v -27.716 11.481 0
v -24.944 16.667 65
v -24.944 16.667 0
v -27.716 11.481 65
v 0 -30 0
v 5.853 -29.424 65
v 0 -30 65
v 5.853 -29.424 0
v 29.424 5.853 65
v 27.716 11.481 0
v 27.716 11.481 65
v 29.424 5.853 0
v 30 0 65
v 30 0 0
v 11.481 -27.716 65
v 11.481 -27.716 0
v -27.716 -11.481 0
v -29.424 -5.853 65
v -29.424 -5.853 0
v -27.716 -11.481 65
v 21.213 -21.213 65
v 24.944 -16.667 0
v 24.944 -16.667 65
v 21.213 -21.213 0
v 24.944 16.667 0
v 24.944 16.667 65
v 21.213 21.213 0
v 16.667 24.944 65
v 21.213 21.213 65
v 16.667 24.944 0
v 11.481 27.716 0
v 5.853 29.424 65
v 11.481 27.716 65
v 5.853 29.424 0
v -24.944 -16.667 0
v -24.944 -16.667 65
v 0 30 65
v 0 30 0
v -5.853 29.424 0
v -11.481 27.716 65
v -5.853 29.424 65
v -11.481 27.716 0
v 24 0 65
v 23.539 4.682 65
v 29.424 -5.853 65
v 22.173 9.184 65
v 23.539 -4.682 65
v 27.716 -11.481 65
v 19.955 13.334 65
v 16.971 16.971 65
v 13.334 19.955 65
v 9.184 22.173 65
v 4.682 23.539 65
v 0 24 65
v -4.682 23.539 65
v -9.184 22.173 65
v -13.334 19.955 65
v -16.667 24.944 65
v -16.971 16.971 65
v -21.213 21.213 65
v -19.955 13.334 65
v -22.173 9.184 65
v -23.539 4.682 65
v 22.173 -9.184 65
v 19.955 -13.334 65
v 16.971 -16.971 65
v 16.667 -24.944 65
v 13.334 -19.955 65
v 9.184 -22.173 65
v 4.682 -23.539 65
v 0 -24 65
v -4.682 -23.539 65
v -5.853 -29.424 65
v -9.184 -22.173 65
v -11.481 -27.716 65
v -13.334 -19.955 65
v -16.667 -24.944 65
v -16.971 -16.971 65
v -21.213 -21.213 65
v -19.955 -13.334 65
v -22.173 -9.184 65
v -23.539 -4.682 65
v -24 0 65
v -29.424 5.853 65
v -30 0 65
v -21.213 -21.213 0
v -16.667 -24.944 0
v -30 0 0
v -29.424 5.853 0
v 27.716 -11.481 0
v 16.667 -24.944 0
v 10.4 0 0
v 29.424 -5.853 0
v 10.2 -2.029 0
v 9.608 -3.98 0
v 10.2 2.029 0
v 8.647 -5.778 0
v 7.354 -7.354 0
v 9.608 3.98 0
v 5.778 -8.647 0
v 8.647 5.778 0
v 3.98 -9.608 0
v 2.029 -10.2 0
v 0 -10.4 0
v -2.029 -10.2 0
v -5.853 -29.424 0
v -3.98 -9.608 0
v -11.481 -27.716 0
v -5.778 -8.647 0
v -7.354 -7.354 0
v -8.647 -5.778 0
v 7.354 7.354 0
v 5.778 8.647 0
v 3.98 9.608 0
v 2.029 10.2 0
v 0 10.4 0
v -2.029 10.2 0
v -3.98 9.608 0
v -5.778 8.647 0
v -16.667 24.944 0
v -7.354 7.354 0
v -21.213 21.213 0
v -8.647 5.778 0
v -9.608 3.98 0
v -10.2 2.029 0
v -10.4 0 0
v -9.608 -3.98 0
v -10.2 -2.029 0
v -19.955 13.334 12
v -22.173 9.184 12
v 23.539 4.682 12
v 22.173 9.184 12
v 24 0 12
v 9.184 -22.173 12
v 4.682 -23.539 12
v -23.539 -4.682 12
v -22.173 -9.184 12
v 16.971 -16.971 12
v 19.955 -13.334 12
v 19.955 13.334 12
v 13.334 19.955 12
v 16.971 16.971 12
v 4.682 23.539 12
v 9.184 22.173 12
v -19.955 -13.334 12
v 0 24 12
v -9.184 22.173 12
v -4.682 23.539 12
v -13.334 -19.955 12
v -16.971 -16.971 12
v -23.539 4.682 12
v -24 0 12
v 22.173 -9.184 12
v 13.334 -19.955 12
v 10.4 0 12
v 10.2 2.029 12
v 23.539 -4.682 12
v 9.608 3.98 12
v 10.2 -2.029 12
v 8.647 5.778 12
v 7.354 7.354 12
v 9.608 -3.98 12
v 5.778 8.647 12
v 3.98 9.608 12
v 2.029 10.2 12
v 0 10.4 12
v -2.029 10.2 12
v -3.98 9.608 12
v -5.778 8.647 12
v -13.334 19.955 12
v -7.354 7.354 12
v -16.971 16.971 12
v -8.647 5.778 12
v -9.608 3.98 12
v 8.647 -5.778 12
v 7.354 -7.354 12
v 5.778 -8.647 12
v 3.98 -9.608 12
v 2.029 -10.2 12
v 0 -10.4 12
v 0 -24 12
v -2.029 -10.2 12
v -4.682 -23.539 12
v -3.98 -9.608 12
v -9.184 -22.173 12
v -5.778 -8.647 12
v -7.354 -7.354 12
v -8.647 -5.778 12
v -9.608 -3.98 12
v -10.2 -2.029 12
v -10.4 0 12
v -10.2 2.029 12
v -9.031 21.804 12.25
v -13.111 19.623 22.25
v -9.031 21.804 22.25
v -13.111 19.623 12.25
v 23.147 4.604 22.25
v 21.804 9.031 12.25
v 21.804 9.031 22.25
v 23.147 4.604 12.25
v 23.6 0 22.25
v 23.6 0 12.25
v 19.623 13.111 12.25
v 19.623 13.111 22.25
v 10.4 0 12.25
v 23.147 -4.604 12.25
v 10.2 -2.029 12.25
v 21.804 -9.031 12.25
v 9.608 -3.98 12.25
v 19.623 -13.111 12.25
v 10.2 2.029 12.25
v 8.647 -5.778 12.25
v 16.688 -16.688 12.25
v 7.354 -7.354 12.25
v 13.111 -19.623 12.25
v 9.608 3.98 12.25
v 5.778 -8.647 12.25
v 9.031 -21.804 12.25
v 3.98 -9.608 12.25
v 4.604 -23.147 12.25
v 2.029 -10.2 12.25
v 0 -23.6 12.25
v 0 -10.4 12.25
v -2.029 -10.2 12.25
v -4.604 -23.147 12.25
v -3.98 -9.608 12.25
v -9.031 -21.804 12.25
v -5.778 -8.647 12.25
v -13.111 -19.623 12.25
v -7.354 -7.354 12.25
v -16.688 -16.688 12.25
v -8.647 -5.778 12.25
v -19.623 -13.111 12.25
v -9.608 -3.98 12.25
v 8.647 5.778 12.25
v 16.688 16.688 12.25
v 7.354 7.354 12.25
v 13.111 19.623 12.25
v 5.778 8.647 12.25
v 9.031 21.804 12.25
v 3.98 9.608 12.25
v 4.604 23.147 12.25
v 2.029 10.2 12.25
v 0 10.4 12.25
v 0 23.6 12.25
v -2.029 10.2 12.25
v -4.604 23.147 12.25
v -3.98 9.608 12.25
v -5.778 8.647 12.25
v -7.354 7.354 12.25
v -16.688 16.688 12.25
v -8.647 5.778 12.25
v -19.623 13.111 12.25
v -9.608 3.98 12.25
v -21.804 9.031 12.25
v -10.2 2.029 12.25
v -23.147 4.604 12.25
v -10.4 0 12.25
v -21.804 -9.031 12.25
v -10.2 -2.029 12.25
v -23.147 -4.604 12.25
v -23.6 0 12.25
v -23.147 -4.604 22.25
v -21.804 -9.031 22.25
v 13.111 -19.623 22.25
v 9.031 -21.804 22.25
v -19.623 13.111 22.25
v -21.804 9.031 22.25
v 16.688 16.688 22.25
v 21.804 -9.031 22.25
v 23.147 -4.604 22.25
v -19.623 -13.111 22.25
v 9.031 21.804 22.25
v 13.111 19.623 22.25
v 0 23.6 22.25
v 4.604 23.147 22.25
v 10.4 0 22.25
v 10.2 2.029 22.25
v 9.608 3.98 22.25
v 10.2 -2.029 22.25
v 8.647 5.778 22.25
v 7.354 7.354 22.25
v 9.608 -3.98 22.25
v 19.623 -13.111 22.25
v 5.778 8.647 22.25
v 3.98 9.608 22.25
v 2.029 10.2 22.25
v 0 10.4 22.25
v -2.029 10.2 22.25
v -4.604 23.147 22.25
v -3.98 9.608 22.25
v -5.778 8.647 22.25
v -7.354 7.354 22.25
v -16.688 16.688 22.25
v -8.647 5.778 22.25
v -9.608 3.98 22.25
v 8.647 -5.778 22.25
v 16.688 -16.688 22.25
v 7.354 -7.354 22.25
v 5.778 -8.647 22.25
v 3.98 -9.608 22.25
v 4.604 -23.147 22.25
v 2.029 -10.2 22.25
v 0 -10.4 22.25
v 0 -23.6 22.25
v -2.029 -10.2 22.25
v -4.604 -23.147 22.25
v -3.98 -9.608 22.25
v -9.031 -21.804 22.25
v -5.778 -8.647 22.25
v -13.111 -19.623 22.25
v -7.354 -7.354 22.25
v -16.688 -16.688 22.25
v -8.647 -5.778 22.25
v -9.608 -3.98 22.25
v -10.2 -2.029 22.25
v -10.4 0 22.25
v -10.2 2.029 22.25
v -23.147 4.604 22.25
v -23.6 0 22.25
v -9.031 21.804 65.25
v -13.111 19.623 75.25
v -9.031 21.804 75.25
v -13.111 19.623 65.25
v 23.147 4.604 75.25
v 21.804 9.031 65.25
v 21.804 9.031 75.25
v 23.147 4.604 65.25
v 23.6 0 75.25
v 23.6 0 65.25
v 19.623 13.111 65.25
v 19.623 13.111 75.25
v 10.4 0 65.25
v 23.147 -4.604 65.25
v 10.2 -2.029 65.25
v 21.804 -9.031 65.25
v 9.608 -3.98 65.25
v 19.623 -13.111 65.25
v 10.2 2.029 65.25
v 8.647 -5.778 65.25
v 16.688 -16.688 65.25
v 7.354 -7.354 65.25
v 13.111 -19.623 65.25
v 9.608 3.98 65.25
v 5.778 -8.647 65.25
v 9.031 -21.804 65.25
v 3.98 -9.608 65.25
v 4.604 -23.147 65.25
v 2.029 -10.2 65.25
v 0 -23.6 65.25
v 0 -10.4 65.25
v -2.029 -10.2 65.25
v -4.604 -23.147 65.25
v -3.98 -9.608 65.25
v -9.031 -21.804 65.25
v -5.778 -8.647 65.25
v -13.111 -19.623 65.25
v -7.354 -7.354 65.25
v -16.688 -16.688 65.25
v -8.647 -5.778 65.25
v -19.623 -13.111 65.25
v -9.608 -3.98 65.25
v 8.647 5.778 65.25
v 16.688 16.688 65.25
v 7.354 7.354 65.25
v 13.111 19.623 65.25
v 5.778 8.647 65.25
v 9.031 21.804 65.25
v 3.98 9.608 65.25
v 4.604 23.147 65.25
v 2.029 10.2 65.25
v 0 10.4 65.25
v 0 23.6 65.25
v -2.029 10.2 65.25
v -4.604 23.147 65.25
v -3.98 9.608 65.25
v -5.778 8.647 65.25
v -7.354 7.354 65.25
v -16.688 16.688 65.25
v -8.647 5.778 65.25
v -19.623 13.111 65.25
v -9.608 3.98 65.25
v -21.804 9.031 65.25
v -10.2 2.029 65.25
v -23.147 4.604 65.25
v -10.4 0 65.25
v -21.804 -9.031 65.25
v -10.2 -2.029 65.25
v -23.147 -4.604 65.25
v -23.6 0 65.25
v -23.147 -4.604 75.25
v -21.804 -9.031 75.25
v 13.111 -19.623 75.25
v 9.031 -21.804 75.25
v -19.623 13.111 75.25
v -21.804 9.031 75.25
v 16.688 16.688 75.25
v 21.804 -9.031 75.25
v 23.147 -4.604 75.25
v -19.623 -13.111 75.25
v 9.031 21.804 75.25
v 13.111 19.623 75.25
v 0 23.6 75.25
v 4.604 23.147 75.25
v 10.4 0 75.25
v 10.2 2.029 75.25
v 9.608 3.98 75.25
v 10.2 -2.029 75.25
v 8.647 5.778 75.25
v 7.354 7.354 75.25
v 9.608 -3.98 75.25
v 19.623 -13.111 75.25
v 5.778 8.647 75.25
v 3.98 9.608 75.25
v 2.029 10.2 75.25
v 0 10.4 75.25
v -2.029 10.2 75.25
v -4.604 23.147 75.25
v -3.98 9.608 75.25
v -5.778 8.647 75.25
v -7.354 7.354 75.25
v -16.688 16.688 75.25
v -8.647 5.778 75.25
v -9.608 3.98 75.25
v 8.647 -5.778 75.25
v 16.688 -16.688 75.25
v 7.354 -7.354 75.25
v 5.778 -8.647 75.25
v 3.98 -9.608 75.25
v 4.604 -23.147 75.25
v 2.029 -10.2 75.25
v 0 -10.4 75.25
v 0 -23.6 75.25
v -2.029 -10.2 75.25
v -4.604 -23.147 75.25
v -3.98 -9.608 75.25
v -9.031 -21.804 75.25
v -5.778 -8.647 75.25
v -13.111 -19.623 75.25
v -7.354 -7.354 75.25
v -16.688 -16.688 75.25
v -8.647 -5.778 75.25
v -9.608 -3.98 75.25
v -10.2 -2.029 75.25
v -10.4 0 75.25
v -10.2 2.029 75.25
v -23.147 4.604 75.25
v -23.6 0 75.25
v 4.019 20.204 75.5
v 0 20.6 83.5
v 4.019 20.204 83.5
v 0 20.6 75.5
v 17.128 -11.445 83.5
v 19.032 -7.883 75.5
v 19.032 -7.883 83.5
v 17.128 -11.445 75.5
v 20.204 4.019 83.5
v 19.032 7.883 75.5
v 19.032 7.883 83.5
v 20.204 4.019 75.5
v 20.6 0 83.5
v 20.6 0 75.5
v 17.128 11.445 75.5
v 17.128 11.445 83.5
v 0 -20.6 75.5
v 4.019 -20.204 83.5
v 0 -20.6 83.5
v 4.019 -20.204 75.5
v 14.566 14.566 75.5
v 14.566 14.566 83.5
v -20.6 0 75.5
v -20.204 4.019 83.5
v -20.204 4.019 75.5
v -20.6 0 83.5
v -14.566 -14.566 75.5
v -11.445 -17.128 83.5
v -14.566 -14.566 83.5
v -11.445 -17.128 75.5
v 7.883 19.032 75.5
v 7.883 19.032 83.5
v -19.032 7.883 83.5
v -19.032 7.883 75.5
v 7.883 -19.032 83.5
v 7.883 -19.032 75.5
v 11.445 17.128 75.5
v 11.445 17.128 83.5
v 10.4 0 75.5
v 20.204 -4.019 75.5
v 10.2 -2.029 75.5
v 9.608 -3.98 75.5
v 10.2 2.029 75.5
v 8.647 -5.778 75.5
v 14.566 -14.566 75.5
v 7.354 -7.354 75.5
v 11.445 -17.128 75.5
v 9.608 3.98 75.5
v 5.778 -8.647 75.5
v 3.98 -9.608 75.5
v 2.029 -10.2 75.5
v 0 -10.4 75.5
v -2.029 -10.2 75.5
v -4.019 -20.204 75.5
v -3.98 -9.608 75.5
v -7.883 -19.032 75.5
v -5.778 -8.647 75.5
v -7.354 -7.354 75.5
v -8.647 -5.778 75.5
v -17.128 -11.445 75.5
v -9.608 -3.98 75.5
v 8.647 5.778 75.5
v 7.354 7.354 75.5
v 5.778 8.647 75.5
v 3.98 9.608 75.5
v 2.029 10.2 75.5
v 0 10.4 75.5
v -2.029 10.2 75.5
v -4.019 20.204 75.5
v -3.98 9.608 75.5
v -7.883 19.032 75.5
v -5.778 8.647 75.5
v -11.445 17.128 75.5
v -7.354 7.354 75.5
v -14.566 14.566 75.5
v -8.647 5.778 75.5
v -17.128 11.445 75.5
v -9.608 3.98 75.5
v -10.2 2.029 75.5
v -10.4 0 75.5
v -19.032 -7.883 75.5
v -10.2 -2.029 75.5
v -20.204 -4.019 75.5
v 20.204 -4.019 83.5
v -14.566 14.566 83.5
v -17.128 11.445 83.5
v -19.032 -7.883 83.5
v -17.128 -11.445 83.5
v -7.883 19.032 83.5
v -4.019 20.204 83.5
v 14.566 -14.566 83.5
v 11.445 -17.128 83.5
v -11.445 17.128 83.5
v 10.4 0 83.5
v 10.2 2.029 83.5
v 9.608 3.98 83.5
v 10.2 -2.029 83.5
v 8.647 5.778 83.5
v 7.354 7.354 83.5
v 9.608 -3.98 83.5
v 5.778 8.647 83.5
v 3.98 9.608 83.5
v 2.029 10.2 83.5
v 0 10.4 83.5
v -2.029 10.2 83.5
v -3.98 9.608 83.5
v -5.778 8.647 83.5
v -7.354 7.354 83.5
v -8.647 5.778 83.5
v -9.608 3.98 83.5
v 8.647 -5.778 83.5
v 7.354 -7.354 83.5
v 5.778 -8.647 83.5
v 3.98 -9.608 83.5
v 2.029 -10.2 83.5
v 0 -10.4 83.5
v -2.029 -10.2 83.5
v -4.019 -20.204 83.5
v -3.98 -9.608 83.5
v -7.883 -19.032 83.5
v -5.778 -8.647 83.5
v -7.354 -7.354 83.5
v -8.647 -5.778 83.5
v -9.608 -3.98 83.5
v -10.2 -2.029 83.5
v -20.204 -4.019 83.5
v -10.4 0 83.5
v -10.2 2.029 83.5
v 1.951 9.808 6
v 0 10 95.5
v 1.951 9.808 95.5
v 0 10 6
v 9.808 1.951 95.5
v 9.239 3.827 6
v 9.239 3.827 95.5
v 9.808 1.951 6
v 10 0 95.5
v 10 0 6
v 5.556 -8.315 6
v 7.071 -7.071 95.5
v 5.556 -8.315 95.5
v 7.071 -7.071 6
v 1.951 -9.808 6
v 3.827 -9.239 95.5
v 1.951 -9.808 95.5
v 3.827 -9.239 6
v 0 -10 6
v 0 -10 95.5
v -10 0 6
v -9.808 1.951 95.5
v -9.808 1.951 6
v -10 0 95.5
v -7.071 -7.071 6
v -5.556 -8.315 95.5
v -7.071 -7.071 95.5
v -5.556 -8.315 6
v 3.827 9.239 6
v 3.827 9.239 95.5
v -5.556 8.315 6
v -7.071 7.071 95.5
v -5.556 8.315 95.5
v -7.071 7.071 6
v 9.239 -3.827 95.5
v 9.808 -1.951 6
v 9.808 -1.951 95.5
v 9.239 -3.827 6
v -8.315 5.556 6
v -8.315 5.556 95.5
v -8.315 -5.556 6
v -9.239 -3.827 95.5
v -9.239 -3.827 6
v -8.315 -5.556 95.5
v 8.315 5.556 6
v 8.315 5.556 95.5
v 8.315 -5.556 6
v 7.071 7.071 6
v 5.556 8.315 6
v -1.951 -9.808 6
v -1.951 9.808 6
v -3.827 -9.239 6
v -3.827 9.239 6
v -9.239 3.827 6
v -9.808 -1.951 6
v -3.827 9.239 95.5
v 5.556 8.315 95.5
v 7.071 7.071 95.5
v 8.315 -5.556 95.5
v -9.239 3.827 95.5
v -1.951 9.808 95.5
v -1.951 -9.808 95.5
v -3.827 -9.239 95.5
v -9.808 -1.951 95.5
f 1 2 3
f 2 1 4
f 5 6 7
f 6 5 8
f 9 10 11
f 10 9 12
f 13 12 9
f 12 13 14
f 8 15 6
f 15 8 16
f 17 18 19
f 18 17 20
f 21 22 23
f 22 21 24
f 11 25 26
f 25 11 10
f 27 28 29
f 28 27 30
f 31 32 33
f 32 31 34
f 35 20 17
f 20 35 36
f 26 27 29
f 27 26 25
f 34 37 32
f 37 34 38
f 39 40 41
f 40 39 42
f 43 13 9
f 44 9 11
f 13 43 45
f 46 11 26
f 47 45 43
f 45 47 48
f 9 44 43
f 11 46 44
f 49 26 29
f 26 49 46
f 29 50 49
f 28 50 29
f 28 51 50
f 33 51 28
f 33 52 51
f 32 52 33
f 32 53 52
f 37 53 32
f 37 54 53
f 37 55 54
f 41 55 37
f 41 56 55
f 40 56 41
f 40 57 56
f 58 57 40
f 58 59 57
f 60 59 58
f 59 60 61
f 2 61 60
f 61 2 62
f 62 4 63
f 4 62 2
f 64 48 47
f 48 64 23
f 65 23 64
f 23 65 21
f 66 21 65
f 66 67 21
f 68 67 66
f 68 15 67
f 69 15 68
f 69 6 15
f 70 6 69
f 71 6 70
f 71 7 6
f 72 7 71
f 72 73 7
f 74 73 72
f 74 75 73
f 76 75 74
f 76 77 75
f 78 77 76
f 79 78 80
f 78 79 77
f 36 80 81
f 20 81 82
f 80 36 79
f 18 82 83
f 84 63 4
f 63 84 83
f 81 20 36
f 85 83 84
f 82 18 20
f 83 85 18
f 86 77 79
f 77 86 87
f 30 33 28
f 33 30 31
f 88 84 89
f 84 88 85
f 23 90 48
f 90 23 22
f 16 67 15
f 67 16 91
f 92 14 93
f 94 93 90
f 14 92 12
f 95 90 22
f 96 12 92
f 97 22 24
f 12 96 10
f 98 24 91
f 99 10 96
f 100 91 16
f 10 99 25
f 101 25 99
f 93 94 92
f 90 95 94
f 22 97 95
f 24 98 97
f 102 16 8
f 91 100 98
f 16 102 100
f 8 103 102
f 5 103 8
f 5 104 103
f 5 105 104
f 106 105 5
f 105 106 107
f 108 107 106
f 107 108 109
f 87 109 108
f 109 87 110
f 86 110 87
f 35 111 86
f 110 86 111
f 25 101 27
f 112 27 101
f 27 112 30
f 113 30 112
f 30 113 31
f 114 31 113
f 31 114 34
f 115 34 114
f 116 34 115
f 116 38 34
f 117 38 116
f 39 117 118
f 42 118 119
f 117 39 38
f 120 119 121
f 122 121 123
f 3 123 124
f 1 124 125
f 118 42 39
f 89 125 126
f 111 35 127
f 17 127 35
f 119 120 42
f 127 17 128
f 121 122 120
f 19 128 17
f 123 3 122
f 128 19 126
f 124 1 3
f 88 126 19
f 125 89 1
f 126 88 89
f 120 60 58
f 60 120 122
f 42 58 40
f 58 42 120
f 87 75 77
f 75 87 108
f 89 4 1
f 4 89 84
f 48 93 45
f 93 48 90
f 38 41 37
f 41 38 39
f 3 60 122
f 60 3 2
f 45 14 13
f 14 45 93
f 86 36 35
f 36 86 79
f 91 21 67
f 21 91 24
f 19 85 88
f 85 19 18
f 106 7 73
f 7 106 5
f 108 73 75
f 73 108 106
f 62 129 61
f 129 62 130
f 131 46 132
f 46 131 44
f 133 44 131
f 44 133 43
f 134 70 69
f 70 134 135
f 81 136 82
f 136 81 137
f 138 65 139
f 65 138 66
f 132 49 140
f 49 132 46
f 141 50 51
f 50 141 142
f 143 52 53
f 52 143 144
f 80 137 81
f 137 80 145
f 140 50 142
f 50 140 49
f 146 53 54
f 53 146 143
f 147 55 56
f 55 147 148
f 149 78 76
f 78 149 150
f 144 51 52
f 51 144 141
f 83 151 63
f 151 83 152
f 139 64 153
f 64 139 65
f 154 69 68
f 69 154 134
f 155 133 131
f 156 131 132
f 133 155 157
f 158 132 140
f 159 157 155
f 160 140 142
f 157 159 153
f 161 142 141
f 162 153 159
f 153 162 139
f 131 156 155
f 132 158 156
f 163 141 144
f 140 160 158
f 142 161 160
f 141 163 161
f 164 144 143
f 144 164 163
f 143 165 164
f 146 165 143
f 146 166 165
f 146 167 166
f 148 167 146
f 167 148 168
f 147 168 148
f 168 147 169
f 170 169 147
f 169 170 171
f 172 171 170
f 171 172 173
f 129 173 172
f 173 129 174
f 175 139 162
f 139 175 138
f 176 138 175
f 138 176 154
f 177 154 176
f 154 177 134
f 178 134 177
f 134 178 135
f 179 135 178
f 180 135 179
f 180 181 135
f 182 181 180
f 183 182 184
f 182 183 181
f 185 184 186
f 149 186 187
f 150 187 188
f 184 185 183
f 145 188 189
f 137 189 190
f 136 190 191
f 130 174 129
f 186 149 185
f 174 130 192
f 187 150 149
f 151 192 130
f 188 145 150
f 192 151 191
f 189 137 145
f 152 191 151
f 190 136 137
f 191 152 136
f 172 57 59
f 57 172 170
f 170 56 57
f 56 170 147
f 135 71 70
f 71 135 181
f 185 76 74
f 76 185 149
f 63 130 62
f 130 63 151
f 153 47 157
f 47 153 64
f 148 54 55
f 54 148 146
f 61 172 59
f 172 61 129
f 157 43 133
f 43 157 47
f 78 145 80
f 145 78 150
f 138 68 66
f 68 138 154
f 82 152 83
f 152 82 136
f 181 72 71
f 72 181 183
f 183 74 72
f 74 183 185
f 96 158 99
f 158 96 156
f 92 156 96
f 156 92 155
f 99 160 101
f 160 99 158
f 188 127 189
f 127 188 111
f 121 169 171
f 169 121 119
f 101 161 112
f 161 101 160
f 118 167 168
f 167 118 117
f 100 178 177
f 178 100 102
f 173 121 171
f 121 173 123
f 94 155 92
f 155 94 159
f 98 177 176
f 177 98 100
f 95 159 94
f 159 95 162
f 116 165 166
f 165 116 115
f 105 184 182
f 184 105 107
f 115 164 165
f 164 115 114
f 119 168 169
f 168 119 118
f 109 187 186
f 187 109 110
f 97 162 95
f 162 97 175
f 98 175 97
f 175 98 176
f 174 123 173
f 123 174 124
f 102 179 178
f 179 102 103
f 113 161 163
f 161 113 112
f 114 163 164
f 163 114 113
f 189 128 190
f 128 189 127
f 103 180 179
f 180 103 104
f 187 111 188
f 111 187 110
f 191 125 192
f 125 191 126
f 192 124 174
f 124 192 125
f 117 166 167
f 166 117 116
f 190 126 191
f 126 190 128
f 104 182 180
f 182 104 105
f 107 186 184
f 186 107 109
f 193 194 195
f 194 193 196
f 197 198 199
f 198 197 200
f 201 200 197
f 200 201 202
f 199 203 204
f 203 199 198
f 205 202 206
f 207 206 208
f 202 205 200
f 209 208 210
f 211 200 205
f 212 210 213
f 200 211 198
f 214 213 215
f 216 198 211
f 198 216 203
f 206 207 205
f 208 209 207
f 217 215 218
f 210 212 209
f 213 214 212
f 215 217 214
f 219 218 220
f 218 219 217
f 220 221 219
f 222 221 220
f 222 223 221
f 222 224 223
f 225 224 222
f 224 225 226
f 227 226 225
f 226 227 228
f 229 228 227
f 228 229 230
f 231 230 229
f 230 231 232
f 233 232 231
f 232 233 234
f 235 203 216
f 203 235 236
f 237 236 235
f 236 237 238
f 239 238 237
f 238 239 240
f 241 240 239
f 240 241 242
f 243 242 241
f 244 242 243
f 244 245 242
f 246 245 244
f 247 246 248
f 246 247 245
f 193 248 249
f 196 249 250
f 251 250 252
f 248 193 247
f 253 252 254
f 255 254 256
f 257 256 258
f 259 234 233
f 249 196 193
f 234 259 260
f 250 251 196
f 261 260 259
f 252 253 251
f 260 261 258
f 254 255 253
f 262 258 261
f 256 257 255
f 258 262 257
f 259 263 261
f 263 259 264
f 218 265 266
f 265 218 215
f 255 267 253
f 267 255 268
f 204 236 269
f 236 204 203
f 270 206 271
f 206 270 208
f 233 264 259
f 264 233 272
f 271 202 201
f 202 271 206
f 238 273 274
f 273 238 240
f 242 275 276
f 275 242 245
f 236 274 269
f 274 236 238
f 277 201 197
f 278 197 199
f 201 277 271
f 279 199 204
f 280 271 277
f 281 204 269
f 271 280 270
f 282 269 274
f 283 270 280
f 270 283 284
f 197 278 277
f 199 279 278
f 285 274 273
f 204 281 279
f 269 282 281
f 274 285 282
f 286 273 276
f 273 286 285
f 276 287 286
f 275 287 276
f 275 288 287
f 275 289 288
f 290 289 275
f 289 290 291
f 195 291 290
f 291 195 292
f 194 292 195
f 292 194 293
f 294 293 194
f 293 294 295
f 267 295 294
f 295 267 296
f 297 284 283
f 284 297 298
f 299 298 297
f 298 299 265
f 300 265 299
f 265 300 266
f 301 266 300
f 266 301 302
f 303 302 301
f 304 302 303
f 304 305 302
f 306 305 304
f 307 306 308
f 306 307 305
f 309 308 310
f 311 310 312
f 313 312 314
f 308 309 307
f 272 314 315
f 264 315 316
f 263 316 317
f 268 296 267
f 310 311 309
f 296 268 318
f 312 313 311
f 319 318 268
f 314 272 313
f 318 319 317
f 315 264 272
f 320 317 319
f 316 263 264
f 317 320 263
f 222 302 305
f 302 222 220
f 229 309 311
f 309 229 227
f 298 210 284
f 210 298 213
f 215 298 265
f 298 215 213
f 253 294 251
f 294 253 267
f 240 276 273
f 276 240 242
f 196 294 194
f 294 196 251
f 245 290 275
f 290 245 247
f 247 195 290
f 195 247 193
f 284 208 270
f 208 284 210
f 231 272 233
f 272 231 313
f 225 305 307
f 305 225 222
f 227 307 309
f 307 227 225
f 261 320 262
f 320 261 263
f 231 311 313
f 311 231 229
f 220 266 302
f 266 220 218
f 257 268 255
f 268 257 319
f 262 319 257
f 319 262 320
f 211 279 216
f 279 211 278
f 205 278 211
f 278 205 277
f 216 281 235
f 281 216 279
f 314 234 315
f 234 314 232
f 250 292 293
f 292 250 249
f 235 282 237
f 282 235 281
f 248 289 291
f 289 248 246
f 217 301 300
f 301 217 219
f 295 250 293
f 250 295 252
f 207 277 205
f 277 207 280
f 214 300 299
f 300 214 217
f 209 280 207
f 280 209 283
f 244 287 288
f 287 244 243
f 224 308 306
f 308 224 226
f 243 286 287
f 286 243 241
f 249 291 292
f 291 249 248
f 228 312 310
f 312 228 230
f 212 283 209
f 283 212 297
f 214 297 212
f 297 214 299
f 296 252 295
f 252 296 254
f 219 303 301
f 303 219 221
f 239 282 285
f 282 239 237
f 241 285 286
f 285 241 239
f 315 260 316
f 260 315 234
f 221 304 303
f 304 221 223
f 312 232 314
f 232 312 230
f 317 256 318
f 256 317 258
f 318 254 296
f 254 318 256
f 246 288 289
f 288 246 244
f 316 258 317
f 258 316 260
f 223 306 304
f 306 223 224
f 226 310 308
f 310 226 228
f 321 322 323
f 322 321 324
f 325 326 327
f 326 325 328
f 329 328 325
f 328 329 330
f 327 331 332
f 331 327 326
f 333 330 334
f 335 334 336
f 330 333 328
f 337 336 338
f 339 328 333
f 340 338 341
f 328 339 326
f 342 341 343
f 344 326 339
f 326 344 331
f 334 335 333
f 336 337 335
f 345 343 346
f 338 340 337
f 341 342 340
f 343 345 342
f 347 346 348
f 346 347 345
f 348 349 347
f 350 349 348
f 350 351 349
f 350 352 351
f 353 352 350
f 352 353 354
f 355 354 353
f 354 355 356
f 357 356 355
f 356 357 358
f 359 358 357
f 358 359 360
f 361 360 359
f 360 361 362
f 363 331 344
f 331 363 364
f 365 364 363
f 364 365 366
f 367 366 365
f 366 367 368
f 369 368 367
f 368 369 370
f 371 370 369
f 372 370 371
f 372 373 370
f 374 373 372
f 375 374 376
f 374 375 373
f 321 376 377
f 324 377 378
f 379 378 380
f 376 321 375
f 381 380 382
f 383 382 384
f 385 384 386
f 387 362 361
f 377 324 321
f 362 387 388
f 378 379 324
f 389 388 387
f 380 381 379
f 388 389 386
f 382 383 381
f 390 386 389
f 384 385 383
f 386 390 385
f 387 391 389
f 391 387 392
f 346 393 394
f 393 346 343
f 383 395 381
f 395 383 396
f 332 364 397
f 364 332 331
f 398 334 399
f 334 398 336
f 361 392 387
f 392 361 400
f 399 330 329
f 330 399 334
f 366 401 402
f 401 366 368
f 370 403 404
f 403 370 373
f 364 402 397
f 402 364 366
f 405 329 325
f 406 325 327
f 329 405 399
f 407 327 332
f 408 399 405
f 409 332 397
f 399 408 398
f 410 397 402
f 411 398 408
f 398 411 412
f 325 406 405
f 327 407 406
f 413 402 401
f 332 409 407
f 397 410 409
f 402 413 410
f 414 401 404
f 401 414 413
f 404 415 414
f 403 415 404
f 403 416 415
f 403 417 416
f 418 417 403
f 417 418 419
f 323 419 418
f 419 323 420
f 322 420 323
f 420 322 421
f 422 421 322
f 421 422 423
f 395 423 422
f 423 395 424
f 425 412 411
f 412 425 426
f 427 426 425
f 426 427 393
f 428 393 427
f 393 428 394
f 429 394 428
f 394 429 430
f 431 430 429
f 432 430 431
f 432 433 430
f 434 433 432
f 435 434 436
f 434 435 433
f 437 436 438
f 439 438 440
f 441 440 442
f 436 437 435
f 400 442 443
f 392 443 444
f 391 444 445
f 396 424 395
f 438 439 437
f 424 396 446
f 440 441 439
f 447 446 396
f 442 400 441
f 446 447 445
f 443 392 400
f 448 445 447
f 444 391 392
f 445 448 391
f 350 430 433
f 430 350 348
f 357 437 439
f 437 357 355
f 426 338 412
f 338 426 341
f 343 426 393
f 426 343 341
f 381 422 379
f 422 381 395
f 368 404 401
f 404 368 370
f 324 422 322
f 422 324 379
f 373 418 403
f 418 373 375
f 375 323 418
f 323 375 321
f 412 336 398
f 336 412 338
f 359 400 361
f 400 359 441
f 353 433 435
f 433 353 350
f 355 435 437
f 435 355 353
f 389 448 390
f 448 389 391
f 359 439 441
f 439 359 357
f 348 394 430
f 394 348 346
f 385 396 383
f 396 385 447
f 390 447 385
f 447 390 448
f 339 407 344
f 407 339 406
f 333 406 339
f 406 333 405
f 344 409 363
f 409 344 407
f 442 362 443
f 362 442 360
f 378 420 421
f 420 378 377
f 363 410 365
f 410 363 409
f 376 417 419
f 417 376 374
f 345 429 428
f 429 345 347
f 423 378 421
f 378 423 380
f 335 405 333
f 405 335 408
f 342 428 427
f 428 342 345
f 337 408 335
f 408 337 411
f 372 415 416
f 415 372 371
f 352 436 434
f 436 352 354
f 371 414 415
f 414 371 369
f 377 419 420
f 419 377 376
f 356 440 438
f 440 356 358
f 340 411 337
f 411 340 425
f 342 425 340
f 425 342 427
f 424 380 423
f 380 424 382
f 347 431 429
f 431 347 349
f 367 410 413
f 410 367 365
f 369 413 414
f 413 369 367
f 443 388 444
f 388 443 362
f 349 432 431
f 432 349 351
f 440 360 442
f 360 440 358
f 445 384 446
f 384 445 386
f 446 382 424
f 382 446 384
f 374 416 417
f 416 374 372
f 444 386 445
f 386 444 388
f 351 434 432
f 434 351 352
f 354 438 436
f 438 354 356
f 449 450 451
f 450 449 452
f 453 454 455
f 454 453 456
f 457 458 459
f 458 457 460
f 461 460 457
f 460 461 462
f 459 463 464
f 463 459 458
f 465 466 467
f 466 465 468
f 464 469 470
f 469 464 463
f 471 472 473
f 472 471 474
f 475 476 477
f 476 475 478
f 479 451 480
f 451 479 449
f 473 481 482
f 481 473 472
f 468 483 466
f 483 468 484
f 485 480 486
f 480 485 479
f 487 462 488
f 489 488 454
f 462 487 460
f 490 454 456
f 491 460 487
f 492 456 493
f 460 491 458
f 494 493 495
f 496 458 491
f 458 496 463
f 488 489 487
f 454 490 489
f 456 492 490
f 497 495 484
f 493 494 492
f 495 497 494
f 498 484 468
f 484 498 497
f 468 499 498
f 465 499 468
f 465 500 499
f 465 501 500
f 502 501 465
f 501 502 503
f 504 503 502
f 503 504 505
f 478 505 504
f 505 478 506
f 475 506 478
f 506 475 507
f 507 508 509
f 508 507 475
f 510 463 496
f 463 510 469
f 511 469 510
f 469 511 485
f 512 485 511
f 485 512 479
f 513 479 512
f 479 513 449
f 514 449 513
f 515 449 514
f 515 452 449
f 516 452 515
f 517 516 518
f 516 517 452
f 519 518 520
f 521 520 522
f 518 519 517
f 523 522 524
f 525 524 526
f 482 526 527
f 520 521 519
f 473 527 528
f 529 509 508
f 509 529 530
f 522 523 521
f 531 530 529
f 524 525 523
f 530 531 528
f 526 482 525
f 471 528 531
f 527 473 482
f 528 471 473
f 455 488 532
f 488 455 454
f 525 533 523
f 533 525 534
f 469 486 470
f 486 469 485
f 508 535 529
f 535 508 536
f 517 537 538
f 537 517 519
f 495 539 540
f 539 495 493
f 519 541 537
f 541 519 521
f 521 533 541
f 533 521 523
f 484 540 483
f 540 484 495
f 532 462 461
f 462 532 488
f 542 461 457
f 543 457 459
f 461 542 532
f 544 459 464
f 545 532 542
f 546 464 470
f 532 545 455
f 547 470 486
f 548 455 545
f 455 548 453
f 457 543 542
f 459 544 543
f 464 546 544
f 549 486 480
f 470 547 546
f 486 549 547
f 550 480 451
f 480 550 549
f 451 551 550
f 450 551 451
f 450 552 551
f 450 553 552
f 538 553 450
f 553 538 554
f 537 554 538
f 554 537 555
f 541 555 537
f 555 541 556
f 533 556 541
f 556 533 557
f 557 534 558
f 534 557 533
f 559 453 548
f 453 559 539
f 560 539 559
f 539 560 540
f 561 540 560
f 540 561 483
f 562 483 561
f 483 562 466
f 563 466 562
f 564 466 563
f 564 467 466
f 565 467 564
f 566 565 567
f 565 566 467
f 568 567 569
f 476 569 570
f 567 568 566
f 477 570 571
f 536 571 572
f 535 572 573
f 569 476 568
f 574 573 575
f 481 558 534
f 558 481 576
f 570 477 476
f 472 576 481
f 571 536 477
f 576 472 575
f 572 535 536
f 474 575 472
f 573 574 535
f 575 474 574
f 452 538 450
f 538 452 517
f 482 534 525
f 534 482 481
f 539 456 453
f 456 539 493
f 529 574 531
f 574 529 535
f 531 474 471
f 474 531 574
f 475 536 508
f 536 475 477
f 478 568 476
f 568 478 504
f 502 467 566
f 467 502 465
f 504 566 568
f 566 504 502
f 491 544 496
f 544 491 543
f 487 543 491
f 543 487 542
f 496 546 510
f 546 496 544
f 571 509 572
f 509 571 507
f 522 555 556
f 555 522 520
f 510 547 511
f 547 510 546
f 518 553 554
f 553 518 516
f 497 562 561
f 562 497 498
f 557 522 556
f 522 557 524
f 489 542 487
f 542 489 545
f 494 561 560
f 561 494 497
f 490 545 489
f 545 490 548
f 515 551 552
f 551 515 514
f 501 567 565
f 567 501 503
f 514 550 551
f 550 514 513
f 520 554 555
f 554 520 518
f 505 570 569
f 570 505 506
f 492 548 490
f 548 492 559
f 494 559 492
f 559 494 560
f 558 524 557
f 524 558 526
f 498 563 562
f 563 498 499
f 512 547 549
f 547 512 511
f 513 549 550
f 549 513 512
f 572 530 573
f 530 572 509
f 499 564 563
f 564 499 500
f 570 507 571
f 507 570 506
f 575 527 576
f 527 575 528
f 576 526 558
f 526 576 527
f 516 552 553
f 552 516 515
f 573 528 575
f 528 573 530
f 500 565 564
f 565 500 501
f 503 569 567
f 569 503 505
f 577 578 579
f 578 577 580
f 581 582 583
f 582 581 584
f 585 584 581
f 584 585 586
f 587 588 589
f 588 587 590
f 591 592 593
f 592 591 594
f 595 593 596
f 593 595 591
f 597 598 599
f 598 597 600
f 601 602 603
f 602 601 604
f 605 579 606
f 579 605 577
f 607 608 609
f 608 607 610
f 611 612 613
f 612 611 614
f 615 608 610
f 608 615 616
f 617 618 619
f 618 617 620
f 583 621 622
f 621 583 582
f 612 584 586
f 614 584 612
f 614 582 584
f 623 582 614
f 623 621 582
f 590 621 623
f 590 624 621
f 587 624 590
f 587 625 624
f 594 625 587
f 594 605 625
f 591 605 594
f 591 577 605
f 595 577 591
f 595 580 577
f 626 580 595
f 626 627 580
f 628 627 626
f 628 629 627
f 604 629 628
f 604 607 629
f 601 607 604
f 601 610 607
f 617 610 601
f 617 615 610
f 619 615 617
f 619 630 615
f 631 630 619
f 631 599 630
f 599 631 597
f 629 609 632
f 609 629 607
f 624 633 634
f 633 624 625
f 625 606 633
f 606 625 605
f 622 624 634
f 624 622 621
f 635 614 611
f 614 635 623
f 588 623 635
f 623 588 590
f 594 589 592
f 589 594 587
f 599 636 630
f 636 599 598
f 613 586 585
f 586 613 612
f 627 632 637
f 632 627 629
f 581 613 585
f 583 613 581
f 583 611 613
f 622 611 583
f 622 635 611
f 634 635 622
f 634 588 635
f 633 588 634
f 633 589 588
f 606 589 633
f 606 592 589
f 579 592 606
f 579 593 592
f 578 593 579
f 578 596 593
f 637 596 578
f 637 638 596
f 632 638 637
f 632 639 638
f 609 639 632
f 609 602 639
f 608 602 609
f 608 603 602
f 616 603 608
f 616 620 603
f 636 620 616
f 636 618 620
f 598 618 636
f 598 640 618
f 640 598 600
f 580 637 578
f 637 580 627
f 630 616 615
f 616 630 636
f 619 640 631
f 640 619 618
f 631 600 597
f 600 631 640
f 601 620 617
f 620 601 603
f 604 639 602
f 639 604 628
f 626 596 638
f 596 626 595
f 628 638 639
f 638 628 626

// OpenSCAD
$fn = 32;

// ------------------------------------------------------------------------
// Bearing housing: housing d60, two bearings and a shaft
// Every part is its own module, assembly() places them once.
// ------------------------------------------------------------------------

// --- part 1 ---
module housing() {
  difference() {
    cylinder(h = 65, d = 60);
    translate([0, 0, 12]) cylinder(h = 54, d = 48);
    translate([0, 0, -1]) cylinder(h = 14, d = 20.8);
  }
}

// --- part 2 ---
module bearing_lower() {
  difference() {
      translate([0, 0, 0]) cylinder(h = 10, d = 47.2);
      translate([0, 0, -1]) cylinder(h = 12, d = 20.8);
    }
}

// --- part 3 ---
module bearing_upper() {
  difference() {
      translate([0, 0, 0]) cylinder(h = 10, d = 47.2);
      translate([0, 0, -1]) cylinder(h = 12, d = 20.8);
    }
}

// --- part 4 ---
module spacer() {
  difference() {
      translate([0, 0, 0]) cylinder(h = 8, d = 41.2);
      translate([0, 0, -1]) cylinder(h = 10, d = 20.8);
    }
}

// --- part 5 ---
module shaft() {
  translate([0, 0, -44.75]) cylinder(h = 89.5, d = 20);
}

// --- assembly ---
module assembly() {
  translate([0, 0, 0]) rotate([0, 0, 0]) housing();
  translate([0, 0, 12.25]) rotate([0, 0, 0]) bearing_lower();
  translate([0, 0, 65.25]) rotate([0, 0, 0]) bearing_upper();
  translate([0, 0, 75.5]) rotate([0, 0, 0]) spacer();
  translate([0, 0, 50.75]) rotate([0, 0, 0]) shaft();
}

assembly();
